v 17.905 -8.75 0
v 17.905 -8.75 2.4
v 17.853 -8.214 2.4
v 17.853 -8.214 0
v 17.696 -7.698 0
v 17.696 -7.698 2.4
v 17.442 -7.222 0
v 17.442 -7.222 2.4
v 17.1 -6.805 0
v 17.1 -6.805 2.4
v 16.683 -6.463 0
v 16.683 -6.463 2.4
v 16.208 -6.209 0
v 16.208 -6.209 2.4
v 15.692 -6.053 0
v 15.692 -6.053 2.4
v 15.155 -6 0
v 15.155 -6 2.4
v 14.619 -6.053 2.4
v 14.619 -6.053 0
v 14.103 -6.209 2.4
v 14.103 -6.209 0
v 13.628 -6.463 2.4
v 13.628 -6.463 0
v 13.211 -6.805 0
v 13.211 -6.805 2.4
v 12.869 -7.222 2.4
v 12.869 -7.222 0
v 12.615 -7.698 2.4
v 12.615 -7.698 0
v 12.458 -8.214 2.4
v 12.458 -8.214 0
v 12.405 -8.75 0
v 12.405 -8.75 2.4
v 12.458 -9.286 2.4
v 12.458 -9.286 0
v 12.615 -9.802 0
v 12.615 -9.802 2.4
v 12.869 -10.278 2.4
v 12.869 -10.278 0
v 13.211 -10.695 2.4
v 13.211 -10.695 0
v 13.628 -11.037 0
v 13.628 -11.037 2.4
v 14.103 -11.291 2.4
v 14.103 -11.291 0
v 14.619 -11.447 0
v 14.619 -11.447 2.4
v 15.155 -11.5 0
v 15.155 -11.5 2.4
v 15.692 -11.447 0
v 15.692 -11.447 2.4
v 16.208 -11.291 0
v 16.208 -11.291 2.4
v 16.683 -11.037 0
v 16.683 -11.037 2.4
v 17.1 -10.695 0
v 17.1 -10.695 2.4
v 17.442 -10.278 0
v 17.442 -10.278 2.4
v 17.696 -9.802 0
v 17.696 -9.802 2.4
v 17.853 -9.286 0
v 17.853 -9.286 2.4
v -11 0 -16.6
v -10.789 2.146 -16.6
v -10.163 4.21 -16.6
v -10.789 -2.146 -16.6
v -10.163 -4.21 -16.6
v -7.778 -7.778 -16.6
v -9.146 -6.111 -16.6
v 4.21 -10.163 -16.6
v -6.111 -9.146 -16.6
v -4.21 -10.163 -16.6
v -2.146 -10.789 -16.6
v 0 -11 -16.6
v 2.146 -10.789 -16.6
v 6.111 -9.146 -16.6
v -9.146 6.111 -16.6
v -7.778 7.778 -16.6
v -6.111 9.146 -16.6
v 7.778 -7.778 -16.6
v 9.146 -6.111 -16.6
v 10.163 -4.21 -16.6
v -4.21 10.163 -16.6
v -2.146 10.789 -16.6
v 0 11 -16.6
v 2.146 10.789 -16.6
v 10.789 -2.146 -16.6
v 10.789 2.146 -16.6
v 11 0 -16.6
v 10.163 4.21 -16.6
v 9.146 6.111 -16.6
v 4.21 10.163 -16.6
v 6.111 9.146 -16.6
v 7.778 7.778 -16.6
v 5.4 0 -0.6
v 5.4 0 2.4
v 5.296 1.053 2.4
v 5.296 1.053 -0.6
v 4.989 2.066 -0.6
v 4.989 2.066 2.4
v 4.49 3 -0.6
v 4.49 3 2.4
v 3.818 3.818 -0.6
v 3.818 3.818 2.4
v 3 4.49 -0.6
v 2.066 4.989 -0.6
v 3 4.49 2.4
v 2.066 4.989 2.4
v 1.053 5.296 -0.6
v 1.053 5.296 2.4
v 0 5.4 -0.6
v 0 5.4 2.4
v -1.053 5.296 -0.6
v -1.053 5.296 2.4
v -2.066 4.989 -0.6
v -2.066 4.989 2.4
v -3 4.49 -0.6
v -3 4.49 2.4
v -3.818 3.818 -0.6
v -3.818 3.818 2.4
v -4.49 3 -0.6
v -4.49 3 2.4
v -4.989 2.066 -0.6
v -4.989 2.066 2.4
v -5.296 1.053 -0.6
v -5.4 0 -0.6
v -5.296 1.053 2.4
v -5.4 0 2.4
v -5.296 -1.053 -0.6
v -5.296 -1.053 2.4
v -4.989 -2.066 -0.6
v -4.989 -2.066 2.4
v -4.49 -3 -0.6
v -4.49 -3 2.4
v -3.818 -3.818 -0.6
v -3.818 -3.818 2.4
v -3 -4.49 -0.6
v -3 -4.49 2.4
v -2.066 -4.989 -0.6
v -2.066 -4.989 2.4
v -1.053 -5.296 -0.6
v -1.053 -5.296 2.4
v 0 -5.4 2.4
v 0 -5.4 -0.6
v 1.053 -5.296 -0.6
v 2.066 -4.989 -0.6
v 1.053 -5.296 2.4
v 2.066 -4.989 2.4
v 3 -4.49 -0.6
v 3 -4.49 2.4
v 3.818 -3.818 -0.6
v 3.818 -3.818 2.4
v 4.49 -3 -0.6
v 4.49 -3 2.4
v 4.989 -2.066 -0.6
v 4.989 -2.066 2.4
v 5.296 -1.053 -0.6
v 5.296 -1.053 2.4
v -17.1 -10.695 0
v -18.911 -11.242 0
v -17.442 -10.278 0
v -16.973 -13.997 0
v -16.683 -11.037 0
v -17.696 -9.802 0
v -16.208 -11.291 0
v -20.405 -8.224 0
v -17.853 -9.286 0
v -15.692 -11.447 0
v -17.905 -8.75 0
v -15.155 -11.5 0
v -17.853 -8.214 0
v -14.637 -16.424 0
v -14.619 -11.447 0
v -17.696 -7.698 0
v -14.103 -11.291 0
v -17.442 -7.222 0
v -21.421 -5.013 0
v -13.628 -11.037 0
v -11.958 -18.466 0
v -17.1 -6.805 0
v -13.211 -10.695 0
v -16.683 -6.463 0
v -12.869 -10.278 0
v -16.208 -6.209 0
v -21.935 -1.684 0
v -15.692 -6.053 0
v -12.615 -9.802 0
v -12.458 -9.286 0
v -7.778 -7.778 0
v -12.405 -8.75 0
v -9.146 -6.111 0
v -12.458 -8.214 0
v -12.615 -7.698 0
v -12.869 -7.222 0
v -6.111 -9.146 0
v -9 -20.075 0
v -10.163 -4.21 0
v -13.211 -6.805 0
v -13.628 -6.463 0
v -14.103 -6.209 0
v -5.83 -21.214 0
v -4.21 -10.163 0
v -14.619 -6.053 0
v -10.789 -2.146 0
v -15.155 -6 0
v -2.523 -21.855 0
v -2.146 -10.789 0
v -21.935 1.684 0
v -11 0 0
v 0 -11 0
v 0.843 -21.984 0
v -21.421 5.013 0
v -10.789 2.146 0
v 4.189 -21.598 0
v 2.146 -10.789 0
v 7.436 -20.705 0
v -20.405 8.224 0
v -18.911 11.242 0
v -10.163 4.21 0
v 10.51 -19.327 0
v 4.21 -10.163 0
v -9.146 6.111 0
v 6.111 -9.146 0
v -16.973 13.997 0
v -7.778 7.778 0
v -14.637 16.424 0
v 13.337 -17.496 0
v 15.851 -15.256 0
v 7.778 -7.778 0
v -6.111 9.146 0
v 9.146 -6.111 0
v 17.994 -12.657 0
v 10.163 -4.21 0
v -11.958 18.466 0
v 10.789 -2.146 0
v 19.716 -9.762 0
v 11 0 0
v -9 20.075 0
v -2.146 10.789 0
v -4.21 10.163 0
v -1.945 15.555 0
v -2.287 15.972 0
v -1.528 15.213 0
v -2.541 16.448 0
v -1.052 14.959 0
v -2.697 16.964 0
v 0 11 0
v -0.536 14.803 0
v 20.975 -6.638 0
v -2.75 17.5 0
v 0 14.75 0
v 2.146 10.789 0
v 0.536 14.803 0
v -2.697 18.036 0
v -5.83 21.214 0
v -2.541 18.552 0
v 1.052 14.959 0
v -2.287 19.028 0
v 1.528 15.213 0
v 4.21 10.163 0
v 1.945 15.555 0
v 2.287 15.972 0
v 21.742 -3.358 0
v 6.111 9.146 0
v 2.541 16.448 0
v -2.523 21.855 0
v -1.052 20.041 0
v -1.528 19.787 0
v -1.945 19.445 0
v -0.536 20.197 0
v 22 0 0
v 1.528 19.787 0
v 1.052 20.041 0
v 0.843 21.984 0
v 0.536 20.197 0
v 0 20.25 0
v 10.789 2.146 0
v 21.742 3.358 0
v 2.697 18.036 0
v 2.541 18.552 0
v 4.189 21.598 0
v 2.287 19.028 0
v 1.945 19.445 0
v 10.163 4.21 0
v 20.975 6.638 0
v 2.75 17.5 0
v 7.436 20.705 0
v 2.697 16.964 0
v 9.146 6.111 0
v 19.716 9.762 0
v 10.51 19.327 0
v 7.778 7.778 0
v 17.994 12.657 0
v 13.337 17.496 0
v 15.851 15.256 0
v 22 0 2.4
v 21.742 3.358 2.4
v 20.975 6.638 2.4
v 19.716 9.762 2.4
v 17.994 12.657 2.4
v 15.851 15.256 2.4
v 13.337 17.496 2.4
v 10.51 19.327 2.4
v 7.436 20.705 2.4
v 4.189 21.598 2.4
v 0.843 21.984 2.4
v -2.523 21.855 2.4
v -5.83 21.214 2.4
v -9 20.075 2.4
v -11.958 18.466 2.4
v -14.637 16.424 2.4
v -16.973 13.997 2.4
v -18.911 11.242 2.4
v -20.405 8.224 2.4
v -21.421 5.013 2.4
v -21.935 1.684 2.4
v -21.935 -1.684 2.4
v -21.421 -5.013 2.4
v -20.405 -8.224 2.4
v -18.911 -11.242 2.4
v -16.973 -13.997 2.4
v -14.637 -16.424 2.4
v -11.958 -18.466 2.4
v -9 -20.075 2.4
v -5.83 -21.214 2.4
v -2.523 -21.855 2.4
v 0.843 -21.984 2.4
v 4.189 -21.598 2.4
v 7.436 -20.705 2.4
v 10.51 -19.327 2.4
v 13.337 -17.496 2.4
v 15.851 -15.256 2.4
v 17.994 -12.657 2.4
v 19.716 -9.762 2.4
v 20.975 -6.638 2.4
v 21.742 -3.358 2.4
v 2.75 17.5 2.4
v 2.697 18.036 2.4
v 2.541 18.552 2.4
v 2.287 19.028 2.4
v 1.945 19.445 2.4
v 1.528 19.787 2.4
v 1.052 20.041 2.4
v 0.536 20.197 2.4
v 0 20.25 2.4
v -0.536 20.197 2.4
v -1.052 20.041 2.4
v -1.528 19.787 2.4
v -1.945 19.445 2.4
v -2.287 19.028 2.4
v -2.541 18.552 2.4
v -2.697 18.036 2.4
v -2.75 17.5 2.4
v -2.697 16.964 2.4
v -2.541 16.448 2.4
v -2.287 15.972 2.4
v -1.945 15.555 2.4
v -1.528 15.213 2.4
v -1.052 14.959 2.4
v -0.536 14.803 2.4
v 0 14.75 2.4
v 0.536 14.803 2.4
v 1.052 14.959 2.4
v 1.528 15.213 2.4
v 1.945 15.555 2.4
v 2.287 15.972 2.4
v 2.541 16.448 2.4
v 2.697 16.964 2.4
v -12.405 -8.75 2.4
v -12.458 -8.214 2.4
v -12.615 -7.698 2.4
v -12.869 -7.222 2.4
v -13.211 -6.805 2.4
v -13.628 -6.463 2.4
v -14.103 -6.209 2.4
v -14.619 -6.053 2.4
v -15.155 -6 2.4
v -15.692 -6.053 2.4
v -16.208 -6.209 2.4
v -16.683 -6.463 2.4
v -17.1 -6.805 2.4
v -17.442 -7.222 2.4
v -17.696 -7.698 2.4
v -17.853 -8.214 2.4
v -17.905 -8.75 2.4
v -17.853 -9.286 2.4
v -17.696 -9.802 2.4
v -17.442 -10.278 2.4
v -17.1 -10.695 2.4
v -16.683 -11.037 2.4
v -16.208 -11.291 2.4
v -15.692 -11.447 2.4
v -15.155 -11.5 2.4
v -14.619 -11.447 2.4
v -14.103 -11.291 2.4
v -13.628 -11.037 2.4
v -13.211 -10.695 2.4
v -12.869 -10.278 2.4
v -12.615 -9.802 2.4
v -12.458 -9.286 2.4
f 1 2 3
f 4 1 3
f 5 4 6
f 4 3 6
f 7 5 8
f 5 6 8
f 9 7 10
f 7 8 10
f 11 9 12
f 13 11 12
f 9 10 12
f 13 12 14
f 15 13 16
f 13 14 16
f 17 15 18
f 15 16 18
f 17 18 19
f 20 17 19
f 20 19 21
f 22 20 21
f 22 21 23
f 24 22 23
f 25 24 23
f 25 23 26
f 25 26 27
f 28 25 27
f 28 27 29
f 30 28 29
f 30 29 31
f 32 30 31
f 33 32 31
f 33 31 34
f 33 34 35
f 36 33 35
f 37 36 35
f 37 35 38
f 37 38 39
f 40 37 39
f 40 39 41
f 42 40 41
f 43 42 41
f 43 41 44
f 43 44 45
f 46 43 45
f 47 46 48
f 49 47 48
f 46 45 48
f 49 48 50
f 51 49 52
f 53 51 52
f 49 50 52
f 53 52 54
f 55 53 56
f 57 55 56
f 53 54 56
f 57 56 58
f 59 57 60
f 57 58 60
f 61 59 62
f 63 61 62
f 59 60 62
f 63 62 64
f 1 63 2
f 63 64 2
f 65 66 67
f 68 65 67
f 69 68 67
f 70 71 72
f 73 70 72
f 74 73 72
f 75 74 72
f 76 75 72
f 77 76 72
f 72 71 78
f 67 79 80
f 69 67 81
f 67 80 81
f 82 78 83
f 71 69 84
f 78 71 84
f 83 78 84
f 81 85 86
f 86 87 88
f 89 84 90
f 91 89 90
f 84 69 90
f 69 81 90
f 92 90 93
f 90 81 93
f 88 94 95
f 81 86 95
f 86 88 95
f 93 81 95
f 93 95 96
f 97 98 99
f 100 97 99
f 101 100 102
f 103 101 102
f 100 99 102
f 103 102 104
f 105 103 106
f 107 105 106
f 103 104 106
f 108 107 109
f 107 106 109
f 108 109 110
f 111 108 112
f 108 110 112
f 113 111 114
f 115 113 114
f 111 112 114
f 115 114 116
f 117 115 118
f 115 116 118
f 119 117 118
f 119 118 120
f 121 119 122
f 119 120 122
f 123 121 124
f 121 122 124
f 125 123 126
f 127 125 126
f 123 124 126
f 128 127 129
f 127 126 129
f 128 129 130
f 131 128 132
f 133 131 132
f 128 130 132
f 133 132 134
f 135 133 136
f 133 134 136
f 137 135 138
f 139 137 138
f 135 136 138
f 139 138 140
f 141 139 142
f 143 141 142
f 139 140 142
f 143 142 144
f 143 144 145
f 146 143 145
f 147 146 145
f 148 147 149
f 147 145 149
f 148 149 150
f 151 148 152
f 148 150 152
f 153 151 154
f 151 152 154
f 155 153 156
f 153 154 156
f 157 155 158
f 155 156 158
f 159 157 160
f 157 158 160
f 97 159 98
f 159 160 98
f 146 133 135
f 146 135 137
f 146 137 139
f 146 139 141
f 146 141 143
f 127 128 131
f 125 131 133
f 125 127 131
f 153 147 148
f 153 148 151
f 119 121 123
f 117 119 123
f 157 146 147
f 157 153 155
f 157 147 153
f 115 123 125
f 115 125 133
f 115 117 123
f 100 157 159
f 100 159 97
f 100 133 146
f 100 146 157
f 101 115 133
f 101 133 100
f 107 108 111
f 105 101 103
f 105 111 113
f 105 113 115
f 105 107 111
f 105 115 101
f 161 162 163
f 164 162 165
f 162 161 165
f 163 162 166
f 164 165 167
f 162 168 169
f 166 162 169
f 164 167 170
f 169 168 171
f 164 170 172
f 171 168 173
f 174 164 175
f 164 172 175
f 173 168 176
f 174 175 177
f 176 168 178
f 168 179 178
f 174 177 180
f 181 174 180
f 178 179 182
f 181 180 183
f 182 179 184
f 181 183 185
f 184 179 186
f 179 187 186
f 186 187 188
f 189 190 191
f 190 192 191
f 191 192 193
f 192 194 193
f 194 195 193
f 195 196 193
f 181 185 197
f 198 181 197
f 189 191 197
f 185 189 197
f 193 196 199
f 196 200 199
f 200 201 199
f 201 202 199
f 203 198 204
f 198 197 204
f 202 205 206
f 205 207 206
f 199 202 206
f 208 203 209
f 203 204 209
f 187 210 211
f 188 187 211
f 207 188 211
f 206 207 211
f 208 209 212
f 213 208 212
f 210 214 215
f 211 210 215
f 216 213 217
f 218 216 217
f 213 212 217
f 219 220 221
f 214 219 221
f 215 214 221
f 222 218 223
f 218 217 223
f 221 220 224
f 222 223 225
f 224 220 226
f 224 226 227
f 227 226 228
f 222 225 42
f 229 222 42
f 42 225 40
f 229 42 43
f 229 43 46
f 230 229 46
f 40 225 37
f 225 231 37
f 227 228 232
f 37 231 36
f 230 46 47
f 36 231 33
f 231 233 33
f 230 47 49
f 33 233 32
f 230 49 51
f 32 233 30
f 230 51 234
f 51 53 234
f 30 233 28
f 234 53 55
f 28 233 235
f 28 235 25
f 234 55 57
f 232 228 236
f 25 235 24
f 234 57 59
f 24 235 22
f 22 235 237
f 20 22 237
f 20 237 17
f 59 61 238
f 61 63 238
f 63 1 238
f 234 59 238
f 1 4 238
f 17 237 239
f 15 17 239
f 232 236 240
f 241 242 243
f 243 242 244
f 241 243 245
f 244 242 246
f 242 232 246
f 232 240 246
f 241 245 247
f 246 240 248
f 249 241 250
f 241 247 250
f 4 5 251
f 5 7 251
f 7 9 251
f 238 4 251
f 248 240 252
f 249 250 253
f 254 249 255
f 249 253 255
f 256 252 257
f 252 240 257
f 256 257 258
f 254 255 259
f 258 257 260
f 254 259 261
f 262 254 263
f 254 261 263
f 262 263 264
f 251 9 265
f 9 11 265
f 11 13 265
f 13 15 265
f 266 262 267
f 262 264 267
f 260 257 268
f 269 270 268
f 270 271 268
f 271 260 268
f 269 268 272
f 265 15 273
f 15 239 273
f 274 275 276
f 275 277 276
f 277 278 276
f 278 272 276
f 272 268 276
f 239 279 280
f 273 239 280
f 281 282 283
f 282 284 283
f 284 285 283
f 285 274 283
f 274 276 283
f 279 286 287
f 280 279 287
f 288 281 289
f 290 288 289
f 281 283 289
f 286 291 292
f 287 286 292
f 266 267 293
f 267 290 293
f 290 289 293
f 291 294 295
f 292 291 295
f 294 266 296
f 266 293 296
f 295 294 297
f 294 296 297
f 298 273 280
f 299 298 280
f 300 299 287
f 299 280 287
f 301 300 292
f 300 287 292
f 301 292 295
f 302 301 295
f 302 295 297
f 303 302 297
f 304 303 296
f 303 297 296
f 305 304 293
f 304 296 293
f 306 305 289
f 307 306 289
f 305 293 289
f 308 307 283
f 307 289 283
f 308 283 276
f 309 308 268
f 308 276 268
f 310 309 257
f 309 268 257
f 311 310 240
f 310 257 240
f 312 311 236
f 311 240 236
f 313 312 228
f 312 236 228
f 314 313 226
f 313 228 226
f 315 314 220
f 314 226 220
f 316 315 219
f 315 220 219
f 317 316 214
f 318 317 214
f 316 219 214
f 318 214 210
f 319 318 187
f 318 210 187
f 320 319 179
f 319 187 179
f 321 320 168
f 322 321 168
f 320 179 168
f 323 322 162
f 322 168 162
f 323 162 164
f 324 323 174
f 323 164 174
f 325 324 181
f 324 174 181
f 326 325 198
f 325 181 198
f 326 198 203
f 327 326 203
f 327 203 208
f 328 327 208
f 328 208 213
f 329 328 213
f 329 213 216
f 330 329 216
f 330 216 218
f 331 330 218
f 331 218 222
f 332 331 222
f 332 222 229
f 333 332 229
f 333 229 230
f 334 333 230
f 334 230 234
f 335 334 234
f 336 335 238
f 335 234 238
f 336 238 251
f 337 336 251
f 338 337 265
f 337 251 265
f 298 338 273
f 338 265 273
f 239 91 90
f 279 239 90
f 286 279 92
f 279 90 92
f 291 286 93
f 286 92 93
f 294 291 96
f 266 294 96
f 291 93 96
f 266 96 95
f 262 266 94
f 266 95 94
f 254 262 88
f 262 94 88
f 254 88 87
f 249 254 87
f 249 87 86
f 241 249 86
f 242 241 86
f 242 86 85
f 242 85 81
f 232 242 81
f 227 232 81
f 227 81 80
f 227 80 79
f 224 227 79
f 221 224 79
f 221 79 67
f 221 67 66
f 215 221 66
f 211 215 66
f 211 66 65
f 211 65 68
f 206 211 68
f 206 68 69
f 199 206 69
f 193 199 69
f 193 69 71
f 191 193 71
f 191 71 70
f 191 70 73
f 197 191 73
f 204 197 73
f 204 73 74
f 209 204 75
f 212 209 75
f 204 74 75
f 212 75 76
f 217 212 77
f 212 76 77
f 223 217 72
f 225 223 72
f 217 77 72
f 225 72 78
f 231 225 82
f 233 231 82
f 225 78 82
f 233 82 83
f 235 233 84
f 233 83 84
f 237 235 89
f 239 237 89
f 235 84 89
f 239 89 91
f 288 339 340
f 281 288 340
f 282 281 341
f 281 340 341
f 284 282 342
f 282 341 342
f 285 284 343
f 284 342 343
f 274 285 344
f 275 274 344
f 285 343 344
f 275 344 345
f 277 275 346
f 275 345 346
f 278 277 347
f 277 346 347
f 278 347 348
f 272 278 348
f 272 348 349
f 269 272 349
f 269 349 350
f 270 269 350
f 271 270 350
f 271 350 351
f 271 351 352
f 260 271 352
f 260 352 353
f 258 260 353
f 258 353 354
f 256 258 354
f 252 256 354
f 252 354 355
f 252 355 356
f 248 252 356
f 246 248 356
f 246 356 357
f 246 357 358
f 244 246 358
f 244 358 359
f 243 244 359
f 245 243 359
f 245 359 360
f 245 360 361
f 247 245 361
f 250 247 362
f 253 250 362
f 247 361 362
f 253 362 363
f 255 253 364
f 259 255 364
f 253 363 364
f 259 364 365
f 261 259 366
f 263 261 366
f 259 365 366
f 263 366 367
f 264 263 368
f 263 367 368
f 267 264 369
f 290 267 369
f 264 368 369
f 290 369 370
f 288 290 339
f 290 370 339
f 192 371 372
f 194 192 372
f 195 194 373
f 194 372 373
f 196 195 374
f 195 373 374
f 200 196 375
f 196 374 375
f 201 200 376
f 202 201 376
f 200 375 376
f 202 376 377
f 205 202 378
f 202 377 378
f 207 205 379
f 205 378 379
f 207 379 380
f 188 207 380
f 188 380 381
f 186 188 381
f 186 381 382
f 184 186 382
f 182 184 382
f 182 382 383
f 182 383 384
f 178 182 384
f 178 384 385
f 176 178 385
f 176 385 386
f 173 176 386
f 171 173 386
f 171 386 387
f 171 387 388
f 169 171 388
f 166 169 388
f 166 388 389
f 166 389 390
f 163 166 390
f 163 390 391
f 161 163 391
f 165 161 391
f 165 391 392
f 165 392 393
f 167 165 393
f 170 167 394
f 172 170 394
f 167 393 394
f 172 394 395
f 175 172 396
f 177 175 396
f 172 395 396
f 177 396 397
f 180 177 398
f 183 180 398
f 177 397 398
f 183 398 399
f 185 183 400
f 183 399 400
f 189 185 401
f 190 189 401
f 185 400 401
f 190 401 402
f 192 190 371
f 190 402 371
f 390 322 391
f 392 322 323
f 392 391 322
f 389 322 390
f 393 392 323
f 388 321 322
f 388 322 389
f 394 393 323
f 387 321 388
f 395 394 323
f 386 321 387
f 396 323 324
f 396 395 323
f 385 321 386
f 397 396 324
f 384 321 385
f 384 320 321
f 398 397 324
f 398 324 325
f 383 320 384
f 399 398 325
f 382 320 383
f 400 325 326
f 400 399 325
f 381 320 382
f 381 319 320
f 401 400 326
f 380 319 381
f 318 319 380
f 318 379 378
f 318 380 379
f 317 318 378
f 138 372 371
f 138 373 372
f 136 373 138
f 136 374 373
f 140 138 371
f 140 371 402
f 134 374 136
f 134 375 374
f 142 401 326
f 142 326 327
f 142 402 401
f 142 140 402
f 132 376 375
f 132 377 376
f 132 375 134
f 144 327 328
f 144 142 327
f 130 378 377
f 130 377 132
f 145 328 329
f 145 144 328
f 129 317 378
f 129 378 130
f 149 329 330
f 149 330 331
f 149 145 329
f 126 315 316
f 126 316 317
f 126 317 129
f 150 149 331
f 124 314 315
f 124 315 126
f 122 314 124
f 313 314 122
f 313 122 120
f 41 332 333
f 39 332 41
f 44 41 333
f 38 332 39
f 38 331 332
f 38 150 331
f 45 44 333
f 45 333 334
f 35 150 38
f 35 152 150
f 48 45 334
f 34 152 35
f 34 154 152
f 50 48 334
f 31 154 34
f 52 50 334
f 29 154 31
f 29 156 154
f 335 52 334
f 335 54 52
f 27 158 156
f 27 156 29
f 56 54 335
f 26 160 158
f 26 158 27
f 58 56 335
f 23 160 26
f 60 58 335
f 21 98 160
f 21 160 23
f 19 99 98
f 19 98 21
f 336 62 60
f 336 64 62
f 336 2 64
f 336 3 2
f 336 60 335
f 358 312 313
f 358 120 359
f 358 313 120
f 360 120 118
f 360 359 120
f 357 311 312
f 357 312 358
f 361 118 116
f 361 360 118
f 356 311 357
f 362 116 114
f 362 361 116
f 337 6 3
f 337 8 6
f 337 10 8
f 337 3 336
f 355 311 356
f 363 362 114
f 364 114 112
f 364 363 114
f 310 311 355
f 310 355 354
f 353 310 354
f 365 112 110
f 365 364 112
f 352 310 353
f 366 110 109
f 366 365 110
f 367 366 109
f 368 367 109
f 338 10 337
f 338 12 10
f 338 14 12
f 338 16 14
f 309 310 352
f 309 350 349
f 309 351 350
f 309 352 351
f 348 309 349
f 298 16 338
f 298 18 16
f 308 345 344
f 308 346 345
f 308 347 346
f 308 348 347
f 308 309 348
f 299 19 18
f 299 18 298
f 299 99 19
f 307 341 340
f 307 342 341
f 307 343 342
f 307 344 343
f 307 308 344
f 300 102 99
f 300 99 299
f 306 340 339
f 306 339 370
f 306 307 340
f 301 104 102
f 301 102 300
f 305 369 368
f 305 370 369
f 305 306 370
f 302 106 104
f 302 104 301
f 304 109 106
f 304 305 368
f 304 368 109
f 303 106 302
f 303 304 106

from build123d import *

# Parameters (mm, degrees)
SKETCH1_R           = 22
SKETCH1_R_2         = 11
BOSS_EXTRUDE1_DEPTH = 2.4
SKETCH2_R           = 2.75
CUT_EXTRUDE1_DEPTH  = 32.205127784
BOSS_EXTRUDE4_START = -19
SKETCH4_R           = 11
BOSS_EXTRUDE4_DEPTH = 19
SKETCH6_R           = 5.4
CUT_EXTRUDE2_DEPTH  = 3


with BuildPart() as part:
    # Sketch1 → Boss-Extrude1 (new body)
    with BuildSketch(Plane.XY):
        Circle(SKETCH1_R)
        Circle(SKETCH1_R_2, mode=Mode.SUBTRACT)
    extrude(amount=BOSS_EXTRUDE1_DEPTH)

    # Sketch2 → Cut-Extrude1 (cut, through all)
    with BuildSketch(Plane.XY.offset(2.4)):
        with Locations((0, 17.5)):
            Circle(SKETCH2_R)
        with Locations((15.155444566, -8.75)):
            Circle(SKETCH2_R)
        with Locations((-15.155444566, -8.75)):
            Circle(SKETCH2_R)
    extrude(amount=-CUT_EXTRUDE1_DEPTH, mode=Mode.SUBTRACT)

    # Sketch4 → Boss-Extrude4 (add)
    with BuildSketch(Plane.XY.offset(2.4).offset(BOSS_EXTRUDE4_START)):
        Circle(SKETCH4_R)
    extrude(amount=BOSS_EXTRUDE4_DEPTH)

    # Sketch6 → Cut-Extrude2 (cut)
    with BuildSketch(Plane.XY.offset(2.4)):
        Circle(SKETCH6_R)
    extrude(amount=-CUT_EXTRUDE2_DEPTH, mode=Mode.SUBTRACT)


solid = part.part
